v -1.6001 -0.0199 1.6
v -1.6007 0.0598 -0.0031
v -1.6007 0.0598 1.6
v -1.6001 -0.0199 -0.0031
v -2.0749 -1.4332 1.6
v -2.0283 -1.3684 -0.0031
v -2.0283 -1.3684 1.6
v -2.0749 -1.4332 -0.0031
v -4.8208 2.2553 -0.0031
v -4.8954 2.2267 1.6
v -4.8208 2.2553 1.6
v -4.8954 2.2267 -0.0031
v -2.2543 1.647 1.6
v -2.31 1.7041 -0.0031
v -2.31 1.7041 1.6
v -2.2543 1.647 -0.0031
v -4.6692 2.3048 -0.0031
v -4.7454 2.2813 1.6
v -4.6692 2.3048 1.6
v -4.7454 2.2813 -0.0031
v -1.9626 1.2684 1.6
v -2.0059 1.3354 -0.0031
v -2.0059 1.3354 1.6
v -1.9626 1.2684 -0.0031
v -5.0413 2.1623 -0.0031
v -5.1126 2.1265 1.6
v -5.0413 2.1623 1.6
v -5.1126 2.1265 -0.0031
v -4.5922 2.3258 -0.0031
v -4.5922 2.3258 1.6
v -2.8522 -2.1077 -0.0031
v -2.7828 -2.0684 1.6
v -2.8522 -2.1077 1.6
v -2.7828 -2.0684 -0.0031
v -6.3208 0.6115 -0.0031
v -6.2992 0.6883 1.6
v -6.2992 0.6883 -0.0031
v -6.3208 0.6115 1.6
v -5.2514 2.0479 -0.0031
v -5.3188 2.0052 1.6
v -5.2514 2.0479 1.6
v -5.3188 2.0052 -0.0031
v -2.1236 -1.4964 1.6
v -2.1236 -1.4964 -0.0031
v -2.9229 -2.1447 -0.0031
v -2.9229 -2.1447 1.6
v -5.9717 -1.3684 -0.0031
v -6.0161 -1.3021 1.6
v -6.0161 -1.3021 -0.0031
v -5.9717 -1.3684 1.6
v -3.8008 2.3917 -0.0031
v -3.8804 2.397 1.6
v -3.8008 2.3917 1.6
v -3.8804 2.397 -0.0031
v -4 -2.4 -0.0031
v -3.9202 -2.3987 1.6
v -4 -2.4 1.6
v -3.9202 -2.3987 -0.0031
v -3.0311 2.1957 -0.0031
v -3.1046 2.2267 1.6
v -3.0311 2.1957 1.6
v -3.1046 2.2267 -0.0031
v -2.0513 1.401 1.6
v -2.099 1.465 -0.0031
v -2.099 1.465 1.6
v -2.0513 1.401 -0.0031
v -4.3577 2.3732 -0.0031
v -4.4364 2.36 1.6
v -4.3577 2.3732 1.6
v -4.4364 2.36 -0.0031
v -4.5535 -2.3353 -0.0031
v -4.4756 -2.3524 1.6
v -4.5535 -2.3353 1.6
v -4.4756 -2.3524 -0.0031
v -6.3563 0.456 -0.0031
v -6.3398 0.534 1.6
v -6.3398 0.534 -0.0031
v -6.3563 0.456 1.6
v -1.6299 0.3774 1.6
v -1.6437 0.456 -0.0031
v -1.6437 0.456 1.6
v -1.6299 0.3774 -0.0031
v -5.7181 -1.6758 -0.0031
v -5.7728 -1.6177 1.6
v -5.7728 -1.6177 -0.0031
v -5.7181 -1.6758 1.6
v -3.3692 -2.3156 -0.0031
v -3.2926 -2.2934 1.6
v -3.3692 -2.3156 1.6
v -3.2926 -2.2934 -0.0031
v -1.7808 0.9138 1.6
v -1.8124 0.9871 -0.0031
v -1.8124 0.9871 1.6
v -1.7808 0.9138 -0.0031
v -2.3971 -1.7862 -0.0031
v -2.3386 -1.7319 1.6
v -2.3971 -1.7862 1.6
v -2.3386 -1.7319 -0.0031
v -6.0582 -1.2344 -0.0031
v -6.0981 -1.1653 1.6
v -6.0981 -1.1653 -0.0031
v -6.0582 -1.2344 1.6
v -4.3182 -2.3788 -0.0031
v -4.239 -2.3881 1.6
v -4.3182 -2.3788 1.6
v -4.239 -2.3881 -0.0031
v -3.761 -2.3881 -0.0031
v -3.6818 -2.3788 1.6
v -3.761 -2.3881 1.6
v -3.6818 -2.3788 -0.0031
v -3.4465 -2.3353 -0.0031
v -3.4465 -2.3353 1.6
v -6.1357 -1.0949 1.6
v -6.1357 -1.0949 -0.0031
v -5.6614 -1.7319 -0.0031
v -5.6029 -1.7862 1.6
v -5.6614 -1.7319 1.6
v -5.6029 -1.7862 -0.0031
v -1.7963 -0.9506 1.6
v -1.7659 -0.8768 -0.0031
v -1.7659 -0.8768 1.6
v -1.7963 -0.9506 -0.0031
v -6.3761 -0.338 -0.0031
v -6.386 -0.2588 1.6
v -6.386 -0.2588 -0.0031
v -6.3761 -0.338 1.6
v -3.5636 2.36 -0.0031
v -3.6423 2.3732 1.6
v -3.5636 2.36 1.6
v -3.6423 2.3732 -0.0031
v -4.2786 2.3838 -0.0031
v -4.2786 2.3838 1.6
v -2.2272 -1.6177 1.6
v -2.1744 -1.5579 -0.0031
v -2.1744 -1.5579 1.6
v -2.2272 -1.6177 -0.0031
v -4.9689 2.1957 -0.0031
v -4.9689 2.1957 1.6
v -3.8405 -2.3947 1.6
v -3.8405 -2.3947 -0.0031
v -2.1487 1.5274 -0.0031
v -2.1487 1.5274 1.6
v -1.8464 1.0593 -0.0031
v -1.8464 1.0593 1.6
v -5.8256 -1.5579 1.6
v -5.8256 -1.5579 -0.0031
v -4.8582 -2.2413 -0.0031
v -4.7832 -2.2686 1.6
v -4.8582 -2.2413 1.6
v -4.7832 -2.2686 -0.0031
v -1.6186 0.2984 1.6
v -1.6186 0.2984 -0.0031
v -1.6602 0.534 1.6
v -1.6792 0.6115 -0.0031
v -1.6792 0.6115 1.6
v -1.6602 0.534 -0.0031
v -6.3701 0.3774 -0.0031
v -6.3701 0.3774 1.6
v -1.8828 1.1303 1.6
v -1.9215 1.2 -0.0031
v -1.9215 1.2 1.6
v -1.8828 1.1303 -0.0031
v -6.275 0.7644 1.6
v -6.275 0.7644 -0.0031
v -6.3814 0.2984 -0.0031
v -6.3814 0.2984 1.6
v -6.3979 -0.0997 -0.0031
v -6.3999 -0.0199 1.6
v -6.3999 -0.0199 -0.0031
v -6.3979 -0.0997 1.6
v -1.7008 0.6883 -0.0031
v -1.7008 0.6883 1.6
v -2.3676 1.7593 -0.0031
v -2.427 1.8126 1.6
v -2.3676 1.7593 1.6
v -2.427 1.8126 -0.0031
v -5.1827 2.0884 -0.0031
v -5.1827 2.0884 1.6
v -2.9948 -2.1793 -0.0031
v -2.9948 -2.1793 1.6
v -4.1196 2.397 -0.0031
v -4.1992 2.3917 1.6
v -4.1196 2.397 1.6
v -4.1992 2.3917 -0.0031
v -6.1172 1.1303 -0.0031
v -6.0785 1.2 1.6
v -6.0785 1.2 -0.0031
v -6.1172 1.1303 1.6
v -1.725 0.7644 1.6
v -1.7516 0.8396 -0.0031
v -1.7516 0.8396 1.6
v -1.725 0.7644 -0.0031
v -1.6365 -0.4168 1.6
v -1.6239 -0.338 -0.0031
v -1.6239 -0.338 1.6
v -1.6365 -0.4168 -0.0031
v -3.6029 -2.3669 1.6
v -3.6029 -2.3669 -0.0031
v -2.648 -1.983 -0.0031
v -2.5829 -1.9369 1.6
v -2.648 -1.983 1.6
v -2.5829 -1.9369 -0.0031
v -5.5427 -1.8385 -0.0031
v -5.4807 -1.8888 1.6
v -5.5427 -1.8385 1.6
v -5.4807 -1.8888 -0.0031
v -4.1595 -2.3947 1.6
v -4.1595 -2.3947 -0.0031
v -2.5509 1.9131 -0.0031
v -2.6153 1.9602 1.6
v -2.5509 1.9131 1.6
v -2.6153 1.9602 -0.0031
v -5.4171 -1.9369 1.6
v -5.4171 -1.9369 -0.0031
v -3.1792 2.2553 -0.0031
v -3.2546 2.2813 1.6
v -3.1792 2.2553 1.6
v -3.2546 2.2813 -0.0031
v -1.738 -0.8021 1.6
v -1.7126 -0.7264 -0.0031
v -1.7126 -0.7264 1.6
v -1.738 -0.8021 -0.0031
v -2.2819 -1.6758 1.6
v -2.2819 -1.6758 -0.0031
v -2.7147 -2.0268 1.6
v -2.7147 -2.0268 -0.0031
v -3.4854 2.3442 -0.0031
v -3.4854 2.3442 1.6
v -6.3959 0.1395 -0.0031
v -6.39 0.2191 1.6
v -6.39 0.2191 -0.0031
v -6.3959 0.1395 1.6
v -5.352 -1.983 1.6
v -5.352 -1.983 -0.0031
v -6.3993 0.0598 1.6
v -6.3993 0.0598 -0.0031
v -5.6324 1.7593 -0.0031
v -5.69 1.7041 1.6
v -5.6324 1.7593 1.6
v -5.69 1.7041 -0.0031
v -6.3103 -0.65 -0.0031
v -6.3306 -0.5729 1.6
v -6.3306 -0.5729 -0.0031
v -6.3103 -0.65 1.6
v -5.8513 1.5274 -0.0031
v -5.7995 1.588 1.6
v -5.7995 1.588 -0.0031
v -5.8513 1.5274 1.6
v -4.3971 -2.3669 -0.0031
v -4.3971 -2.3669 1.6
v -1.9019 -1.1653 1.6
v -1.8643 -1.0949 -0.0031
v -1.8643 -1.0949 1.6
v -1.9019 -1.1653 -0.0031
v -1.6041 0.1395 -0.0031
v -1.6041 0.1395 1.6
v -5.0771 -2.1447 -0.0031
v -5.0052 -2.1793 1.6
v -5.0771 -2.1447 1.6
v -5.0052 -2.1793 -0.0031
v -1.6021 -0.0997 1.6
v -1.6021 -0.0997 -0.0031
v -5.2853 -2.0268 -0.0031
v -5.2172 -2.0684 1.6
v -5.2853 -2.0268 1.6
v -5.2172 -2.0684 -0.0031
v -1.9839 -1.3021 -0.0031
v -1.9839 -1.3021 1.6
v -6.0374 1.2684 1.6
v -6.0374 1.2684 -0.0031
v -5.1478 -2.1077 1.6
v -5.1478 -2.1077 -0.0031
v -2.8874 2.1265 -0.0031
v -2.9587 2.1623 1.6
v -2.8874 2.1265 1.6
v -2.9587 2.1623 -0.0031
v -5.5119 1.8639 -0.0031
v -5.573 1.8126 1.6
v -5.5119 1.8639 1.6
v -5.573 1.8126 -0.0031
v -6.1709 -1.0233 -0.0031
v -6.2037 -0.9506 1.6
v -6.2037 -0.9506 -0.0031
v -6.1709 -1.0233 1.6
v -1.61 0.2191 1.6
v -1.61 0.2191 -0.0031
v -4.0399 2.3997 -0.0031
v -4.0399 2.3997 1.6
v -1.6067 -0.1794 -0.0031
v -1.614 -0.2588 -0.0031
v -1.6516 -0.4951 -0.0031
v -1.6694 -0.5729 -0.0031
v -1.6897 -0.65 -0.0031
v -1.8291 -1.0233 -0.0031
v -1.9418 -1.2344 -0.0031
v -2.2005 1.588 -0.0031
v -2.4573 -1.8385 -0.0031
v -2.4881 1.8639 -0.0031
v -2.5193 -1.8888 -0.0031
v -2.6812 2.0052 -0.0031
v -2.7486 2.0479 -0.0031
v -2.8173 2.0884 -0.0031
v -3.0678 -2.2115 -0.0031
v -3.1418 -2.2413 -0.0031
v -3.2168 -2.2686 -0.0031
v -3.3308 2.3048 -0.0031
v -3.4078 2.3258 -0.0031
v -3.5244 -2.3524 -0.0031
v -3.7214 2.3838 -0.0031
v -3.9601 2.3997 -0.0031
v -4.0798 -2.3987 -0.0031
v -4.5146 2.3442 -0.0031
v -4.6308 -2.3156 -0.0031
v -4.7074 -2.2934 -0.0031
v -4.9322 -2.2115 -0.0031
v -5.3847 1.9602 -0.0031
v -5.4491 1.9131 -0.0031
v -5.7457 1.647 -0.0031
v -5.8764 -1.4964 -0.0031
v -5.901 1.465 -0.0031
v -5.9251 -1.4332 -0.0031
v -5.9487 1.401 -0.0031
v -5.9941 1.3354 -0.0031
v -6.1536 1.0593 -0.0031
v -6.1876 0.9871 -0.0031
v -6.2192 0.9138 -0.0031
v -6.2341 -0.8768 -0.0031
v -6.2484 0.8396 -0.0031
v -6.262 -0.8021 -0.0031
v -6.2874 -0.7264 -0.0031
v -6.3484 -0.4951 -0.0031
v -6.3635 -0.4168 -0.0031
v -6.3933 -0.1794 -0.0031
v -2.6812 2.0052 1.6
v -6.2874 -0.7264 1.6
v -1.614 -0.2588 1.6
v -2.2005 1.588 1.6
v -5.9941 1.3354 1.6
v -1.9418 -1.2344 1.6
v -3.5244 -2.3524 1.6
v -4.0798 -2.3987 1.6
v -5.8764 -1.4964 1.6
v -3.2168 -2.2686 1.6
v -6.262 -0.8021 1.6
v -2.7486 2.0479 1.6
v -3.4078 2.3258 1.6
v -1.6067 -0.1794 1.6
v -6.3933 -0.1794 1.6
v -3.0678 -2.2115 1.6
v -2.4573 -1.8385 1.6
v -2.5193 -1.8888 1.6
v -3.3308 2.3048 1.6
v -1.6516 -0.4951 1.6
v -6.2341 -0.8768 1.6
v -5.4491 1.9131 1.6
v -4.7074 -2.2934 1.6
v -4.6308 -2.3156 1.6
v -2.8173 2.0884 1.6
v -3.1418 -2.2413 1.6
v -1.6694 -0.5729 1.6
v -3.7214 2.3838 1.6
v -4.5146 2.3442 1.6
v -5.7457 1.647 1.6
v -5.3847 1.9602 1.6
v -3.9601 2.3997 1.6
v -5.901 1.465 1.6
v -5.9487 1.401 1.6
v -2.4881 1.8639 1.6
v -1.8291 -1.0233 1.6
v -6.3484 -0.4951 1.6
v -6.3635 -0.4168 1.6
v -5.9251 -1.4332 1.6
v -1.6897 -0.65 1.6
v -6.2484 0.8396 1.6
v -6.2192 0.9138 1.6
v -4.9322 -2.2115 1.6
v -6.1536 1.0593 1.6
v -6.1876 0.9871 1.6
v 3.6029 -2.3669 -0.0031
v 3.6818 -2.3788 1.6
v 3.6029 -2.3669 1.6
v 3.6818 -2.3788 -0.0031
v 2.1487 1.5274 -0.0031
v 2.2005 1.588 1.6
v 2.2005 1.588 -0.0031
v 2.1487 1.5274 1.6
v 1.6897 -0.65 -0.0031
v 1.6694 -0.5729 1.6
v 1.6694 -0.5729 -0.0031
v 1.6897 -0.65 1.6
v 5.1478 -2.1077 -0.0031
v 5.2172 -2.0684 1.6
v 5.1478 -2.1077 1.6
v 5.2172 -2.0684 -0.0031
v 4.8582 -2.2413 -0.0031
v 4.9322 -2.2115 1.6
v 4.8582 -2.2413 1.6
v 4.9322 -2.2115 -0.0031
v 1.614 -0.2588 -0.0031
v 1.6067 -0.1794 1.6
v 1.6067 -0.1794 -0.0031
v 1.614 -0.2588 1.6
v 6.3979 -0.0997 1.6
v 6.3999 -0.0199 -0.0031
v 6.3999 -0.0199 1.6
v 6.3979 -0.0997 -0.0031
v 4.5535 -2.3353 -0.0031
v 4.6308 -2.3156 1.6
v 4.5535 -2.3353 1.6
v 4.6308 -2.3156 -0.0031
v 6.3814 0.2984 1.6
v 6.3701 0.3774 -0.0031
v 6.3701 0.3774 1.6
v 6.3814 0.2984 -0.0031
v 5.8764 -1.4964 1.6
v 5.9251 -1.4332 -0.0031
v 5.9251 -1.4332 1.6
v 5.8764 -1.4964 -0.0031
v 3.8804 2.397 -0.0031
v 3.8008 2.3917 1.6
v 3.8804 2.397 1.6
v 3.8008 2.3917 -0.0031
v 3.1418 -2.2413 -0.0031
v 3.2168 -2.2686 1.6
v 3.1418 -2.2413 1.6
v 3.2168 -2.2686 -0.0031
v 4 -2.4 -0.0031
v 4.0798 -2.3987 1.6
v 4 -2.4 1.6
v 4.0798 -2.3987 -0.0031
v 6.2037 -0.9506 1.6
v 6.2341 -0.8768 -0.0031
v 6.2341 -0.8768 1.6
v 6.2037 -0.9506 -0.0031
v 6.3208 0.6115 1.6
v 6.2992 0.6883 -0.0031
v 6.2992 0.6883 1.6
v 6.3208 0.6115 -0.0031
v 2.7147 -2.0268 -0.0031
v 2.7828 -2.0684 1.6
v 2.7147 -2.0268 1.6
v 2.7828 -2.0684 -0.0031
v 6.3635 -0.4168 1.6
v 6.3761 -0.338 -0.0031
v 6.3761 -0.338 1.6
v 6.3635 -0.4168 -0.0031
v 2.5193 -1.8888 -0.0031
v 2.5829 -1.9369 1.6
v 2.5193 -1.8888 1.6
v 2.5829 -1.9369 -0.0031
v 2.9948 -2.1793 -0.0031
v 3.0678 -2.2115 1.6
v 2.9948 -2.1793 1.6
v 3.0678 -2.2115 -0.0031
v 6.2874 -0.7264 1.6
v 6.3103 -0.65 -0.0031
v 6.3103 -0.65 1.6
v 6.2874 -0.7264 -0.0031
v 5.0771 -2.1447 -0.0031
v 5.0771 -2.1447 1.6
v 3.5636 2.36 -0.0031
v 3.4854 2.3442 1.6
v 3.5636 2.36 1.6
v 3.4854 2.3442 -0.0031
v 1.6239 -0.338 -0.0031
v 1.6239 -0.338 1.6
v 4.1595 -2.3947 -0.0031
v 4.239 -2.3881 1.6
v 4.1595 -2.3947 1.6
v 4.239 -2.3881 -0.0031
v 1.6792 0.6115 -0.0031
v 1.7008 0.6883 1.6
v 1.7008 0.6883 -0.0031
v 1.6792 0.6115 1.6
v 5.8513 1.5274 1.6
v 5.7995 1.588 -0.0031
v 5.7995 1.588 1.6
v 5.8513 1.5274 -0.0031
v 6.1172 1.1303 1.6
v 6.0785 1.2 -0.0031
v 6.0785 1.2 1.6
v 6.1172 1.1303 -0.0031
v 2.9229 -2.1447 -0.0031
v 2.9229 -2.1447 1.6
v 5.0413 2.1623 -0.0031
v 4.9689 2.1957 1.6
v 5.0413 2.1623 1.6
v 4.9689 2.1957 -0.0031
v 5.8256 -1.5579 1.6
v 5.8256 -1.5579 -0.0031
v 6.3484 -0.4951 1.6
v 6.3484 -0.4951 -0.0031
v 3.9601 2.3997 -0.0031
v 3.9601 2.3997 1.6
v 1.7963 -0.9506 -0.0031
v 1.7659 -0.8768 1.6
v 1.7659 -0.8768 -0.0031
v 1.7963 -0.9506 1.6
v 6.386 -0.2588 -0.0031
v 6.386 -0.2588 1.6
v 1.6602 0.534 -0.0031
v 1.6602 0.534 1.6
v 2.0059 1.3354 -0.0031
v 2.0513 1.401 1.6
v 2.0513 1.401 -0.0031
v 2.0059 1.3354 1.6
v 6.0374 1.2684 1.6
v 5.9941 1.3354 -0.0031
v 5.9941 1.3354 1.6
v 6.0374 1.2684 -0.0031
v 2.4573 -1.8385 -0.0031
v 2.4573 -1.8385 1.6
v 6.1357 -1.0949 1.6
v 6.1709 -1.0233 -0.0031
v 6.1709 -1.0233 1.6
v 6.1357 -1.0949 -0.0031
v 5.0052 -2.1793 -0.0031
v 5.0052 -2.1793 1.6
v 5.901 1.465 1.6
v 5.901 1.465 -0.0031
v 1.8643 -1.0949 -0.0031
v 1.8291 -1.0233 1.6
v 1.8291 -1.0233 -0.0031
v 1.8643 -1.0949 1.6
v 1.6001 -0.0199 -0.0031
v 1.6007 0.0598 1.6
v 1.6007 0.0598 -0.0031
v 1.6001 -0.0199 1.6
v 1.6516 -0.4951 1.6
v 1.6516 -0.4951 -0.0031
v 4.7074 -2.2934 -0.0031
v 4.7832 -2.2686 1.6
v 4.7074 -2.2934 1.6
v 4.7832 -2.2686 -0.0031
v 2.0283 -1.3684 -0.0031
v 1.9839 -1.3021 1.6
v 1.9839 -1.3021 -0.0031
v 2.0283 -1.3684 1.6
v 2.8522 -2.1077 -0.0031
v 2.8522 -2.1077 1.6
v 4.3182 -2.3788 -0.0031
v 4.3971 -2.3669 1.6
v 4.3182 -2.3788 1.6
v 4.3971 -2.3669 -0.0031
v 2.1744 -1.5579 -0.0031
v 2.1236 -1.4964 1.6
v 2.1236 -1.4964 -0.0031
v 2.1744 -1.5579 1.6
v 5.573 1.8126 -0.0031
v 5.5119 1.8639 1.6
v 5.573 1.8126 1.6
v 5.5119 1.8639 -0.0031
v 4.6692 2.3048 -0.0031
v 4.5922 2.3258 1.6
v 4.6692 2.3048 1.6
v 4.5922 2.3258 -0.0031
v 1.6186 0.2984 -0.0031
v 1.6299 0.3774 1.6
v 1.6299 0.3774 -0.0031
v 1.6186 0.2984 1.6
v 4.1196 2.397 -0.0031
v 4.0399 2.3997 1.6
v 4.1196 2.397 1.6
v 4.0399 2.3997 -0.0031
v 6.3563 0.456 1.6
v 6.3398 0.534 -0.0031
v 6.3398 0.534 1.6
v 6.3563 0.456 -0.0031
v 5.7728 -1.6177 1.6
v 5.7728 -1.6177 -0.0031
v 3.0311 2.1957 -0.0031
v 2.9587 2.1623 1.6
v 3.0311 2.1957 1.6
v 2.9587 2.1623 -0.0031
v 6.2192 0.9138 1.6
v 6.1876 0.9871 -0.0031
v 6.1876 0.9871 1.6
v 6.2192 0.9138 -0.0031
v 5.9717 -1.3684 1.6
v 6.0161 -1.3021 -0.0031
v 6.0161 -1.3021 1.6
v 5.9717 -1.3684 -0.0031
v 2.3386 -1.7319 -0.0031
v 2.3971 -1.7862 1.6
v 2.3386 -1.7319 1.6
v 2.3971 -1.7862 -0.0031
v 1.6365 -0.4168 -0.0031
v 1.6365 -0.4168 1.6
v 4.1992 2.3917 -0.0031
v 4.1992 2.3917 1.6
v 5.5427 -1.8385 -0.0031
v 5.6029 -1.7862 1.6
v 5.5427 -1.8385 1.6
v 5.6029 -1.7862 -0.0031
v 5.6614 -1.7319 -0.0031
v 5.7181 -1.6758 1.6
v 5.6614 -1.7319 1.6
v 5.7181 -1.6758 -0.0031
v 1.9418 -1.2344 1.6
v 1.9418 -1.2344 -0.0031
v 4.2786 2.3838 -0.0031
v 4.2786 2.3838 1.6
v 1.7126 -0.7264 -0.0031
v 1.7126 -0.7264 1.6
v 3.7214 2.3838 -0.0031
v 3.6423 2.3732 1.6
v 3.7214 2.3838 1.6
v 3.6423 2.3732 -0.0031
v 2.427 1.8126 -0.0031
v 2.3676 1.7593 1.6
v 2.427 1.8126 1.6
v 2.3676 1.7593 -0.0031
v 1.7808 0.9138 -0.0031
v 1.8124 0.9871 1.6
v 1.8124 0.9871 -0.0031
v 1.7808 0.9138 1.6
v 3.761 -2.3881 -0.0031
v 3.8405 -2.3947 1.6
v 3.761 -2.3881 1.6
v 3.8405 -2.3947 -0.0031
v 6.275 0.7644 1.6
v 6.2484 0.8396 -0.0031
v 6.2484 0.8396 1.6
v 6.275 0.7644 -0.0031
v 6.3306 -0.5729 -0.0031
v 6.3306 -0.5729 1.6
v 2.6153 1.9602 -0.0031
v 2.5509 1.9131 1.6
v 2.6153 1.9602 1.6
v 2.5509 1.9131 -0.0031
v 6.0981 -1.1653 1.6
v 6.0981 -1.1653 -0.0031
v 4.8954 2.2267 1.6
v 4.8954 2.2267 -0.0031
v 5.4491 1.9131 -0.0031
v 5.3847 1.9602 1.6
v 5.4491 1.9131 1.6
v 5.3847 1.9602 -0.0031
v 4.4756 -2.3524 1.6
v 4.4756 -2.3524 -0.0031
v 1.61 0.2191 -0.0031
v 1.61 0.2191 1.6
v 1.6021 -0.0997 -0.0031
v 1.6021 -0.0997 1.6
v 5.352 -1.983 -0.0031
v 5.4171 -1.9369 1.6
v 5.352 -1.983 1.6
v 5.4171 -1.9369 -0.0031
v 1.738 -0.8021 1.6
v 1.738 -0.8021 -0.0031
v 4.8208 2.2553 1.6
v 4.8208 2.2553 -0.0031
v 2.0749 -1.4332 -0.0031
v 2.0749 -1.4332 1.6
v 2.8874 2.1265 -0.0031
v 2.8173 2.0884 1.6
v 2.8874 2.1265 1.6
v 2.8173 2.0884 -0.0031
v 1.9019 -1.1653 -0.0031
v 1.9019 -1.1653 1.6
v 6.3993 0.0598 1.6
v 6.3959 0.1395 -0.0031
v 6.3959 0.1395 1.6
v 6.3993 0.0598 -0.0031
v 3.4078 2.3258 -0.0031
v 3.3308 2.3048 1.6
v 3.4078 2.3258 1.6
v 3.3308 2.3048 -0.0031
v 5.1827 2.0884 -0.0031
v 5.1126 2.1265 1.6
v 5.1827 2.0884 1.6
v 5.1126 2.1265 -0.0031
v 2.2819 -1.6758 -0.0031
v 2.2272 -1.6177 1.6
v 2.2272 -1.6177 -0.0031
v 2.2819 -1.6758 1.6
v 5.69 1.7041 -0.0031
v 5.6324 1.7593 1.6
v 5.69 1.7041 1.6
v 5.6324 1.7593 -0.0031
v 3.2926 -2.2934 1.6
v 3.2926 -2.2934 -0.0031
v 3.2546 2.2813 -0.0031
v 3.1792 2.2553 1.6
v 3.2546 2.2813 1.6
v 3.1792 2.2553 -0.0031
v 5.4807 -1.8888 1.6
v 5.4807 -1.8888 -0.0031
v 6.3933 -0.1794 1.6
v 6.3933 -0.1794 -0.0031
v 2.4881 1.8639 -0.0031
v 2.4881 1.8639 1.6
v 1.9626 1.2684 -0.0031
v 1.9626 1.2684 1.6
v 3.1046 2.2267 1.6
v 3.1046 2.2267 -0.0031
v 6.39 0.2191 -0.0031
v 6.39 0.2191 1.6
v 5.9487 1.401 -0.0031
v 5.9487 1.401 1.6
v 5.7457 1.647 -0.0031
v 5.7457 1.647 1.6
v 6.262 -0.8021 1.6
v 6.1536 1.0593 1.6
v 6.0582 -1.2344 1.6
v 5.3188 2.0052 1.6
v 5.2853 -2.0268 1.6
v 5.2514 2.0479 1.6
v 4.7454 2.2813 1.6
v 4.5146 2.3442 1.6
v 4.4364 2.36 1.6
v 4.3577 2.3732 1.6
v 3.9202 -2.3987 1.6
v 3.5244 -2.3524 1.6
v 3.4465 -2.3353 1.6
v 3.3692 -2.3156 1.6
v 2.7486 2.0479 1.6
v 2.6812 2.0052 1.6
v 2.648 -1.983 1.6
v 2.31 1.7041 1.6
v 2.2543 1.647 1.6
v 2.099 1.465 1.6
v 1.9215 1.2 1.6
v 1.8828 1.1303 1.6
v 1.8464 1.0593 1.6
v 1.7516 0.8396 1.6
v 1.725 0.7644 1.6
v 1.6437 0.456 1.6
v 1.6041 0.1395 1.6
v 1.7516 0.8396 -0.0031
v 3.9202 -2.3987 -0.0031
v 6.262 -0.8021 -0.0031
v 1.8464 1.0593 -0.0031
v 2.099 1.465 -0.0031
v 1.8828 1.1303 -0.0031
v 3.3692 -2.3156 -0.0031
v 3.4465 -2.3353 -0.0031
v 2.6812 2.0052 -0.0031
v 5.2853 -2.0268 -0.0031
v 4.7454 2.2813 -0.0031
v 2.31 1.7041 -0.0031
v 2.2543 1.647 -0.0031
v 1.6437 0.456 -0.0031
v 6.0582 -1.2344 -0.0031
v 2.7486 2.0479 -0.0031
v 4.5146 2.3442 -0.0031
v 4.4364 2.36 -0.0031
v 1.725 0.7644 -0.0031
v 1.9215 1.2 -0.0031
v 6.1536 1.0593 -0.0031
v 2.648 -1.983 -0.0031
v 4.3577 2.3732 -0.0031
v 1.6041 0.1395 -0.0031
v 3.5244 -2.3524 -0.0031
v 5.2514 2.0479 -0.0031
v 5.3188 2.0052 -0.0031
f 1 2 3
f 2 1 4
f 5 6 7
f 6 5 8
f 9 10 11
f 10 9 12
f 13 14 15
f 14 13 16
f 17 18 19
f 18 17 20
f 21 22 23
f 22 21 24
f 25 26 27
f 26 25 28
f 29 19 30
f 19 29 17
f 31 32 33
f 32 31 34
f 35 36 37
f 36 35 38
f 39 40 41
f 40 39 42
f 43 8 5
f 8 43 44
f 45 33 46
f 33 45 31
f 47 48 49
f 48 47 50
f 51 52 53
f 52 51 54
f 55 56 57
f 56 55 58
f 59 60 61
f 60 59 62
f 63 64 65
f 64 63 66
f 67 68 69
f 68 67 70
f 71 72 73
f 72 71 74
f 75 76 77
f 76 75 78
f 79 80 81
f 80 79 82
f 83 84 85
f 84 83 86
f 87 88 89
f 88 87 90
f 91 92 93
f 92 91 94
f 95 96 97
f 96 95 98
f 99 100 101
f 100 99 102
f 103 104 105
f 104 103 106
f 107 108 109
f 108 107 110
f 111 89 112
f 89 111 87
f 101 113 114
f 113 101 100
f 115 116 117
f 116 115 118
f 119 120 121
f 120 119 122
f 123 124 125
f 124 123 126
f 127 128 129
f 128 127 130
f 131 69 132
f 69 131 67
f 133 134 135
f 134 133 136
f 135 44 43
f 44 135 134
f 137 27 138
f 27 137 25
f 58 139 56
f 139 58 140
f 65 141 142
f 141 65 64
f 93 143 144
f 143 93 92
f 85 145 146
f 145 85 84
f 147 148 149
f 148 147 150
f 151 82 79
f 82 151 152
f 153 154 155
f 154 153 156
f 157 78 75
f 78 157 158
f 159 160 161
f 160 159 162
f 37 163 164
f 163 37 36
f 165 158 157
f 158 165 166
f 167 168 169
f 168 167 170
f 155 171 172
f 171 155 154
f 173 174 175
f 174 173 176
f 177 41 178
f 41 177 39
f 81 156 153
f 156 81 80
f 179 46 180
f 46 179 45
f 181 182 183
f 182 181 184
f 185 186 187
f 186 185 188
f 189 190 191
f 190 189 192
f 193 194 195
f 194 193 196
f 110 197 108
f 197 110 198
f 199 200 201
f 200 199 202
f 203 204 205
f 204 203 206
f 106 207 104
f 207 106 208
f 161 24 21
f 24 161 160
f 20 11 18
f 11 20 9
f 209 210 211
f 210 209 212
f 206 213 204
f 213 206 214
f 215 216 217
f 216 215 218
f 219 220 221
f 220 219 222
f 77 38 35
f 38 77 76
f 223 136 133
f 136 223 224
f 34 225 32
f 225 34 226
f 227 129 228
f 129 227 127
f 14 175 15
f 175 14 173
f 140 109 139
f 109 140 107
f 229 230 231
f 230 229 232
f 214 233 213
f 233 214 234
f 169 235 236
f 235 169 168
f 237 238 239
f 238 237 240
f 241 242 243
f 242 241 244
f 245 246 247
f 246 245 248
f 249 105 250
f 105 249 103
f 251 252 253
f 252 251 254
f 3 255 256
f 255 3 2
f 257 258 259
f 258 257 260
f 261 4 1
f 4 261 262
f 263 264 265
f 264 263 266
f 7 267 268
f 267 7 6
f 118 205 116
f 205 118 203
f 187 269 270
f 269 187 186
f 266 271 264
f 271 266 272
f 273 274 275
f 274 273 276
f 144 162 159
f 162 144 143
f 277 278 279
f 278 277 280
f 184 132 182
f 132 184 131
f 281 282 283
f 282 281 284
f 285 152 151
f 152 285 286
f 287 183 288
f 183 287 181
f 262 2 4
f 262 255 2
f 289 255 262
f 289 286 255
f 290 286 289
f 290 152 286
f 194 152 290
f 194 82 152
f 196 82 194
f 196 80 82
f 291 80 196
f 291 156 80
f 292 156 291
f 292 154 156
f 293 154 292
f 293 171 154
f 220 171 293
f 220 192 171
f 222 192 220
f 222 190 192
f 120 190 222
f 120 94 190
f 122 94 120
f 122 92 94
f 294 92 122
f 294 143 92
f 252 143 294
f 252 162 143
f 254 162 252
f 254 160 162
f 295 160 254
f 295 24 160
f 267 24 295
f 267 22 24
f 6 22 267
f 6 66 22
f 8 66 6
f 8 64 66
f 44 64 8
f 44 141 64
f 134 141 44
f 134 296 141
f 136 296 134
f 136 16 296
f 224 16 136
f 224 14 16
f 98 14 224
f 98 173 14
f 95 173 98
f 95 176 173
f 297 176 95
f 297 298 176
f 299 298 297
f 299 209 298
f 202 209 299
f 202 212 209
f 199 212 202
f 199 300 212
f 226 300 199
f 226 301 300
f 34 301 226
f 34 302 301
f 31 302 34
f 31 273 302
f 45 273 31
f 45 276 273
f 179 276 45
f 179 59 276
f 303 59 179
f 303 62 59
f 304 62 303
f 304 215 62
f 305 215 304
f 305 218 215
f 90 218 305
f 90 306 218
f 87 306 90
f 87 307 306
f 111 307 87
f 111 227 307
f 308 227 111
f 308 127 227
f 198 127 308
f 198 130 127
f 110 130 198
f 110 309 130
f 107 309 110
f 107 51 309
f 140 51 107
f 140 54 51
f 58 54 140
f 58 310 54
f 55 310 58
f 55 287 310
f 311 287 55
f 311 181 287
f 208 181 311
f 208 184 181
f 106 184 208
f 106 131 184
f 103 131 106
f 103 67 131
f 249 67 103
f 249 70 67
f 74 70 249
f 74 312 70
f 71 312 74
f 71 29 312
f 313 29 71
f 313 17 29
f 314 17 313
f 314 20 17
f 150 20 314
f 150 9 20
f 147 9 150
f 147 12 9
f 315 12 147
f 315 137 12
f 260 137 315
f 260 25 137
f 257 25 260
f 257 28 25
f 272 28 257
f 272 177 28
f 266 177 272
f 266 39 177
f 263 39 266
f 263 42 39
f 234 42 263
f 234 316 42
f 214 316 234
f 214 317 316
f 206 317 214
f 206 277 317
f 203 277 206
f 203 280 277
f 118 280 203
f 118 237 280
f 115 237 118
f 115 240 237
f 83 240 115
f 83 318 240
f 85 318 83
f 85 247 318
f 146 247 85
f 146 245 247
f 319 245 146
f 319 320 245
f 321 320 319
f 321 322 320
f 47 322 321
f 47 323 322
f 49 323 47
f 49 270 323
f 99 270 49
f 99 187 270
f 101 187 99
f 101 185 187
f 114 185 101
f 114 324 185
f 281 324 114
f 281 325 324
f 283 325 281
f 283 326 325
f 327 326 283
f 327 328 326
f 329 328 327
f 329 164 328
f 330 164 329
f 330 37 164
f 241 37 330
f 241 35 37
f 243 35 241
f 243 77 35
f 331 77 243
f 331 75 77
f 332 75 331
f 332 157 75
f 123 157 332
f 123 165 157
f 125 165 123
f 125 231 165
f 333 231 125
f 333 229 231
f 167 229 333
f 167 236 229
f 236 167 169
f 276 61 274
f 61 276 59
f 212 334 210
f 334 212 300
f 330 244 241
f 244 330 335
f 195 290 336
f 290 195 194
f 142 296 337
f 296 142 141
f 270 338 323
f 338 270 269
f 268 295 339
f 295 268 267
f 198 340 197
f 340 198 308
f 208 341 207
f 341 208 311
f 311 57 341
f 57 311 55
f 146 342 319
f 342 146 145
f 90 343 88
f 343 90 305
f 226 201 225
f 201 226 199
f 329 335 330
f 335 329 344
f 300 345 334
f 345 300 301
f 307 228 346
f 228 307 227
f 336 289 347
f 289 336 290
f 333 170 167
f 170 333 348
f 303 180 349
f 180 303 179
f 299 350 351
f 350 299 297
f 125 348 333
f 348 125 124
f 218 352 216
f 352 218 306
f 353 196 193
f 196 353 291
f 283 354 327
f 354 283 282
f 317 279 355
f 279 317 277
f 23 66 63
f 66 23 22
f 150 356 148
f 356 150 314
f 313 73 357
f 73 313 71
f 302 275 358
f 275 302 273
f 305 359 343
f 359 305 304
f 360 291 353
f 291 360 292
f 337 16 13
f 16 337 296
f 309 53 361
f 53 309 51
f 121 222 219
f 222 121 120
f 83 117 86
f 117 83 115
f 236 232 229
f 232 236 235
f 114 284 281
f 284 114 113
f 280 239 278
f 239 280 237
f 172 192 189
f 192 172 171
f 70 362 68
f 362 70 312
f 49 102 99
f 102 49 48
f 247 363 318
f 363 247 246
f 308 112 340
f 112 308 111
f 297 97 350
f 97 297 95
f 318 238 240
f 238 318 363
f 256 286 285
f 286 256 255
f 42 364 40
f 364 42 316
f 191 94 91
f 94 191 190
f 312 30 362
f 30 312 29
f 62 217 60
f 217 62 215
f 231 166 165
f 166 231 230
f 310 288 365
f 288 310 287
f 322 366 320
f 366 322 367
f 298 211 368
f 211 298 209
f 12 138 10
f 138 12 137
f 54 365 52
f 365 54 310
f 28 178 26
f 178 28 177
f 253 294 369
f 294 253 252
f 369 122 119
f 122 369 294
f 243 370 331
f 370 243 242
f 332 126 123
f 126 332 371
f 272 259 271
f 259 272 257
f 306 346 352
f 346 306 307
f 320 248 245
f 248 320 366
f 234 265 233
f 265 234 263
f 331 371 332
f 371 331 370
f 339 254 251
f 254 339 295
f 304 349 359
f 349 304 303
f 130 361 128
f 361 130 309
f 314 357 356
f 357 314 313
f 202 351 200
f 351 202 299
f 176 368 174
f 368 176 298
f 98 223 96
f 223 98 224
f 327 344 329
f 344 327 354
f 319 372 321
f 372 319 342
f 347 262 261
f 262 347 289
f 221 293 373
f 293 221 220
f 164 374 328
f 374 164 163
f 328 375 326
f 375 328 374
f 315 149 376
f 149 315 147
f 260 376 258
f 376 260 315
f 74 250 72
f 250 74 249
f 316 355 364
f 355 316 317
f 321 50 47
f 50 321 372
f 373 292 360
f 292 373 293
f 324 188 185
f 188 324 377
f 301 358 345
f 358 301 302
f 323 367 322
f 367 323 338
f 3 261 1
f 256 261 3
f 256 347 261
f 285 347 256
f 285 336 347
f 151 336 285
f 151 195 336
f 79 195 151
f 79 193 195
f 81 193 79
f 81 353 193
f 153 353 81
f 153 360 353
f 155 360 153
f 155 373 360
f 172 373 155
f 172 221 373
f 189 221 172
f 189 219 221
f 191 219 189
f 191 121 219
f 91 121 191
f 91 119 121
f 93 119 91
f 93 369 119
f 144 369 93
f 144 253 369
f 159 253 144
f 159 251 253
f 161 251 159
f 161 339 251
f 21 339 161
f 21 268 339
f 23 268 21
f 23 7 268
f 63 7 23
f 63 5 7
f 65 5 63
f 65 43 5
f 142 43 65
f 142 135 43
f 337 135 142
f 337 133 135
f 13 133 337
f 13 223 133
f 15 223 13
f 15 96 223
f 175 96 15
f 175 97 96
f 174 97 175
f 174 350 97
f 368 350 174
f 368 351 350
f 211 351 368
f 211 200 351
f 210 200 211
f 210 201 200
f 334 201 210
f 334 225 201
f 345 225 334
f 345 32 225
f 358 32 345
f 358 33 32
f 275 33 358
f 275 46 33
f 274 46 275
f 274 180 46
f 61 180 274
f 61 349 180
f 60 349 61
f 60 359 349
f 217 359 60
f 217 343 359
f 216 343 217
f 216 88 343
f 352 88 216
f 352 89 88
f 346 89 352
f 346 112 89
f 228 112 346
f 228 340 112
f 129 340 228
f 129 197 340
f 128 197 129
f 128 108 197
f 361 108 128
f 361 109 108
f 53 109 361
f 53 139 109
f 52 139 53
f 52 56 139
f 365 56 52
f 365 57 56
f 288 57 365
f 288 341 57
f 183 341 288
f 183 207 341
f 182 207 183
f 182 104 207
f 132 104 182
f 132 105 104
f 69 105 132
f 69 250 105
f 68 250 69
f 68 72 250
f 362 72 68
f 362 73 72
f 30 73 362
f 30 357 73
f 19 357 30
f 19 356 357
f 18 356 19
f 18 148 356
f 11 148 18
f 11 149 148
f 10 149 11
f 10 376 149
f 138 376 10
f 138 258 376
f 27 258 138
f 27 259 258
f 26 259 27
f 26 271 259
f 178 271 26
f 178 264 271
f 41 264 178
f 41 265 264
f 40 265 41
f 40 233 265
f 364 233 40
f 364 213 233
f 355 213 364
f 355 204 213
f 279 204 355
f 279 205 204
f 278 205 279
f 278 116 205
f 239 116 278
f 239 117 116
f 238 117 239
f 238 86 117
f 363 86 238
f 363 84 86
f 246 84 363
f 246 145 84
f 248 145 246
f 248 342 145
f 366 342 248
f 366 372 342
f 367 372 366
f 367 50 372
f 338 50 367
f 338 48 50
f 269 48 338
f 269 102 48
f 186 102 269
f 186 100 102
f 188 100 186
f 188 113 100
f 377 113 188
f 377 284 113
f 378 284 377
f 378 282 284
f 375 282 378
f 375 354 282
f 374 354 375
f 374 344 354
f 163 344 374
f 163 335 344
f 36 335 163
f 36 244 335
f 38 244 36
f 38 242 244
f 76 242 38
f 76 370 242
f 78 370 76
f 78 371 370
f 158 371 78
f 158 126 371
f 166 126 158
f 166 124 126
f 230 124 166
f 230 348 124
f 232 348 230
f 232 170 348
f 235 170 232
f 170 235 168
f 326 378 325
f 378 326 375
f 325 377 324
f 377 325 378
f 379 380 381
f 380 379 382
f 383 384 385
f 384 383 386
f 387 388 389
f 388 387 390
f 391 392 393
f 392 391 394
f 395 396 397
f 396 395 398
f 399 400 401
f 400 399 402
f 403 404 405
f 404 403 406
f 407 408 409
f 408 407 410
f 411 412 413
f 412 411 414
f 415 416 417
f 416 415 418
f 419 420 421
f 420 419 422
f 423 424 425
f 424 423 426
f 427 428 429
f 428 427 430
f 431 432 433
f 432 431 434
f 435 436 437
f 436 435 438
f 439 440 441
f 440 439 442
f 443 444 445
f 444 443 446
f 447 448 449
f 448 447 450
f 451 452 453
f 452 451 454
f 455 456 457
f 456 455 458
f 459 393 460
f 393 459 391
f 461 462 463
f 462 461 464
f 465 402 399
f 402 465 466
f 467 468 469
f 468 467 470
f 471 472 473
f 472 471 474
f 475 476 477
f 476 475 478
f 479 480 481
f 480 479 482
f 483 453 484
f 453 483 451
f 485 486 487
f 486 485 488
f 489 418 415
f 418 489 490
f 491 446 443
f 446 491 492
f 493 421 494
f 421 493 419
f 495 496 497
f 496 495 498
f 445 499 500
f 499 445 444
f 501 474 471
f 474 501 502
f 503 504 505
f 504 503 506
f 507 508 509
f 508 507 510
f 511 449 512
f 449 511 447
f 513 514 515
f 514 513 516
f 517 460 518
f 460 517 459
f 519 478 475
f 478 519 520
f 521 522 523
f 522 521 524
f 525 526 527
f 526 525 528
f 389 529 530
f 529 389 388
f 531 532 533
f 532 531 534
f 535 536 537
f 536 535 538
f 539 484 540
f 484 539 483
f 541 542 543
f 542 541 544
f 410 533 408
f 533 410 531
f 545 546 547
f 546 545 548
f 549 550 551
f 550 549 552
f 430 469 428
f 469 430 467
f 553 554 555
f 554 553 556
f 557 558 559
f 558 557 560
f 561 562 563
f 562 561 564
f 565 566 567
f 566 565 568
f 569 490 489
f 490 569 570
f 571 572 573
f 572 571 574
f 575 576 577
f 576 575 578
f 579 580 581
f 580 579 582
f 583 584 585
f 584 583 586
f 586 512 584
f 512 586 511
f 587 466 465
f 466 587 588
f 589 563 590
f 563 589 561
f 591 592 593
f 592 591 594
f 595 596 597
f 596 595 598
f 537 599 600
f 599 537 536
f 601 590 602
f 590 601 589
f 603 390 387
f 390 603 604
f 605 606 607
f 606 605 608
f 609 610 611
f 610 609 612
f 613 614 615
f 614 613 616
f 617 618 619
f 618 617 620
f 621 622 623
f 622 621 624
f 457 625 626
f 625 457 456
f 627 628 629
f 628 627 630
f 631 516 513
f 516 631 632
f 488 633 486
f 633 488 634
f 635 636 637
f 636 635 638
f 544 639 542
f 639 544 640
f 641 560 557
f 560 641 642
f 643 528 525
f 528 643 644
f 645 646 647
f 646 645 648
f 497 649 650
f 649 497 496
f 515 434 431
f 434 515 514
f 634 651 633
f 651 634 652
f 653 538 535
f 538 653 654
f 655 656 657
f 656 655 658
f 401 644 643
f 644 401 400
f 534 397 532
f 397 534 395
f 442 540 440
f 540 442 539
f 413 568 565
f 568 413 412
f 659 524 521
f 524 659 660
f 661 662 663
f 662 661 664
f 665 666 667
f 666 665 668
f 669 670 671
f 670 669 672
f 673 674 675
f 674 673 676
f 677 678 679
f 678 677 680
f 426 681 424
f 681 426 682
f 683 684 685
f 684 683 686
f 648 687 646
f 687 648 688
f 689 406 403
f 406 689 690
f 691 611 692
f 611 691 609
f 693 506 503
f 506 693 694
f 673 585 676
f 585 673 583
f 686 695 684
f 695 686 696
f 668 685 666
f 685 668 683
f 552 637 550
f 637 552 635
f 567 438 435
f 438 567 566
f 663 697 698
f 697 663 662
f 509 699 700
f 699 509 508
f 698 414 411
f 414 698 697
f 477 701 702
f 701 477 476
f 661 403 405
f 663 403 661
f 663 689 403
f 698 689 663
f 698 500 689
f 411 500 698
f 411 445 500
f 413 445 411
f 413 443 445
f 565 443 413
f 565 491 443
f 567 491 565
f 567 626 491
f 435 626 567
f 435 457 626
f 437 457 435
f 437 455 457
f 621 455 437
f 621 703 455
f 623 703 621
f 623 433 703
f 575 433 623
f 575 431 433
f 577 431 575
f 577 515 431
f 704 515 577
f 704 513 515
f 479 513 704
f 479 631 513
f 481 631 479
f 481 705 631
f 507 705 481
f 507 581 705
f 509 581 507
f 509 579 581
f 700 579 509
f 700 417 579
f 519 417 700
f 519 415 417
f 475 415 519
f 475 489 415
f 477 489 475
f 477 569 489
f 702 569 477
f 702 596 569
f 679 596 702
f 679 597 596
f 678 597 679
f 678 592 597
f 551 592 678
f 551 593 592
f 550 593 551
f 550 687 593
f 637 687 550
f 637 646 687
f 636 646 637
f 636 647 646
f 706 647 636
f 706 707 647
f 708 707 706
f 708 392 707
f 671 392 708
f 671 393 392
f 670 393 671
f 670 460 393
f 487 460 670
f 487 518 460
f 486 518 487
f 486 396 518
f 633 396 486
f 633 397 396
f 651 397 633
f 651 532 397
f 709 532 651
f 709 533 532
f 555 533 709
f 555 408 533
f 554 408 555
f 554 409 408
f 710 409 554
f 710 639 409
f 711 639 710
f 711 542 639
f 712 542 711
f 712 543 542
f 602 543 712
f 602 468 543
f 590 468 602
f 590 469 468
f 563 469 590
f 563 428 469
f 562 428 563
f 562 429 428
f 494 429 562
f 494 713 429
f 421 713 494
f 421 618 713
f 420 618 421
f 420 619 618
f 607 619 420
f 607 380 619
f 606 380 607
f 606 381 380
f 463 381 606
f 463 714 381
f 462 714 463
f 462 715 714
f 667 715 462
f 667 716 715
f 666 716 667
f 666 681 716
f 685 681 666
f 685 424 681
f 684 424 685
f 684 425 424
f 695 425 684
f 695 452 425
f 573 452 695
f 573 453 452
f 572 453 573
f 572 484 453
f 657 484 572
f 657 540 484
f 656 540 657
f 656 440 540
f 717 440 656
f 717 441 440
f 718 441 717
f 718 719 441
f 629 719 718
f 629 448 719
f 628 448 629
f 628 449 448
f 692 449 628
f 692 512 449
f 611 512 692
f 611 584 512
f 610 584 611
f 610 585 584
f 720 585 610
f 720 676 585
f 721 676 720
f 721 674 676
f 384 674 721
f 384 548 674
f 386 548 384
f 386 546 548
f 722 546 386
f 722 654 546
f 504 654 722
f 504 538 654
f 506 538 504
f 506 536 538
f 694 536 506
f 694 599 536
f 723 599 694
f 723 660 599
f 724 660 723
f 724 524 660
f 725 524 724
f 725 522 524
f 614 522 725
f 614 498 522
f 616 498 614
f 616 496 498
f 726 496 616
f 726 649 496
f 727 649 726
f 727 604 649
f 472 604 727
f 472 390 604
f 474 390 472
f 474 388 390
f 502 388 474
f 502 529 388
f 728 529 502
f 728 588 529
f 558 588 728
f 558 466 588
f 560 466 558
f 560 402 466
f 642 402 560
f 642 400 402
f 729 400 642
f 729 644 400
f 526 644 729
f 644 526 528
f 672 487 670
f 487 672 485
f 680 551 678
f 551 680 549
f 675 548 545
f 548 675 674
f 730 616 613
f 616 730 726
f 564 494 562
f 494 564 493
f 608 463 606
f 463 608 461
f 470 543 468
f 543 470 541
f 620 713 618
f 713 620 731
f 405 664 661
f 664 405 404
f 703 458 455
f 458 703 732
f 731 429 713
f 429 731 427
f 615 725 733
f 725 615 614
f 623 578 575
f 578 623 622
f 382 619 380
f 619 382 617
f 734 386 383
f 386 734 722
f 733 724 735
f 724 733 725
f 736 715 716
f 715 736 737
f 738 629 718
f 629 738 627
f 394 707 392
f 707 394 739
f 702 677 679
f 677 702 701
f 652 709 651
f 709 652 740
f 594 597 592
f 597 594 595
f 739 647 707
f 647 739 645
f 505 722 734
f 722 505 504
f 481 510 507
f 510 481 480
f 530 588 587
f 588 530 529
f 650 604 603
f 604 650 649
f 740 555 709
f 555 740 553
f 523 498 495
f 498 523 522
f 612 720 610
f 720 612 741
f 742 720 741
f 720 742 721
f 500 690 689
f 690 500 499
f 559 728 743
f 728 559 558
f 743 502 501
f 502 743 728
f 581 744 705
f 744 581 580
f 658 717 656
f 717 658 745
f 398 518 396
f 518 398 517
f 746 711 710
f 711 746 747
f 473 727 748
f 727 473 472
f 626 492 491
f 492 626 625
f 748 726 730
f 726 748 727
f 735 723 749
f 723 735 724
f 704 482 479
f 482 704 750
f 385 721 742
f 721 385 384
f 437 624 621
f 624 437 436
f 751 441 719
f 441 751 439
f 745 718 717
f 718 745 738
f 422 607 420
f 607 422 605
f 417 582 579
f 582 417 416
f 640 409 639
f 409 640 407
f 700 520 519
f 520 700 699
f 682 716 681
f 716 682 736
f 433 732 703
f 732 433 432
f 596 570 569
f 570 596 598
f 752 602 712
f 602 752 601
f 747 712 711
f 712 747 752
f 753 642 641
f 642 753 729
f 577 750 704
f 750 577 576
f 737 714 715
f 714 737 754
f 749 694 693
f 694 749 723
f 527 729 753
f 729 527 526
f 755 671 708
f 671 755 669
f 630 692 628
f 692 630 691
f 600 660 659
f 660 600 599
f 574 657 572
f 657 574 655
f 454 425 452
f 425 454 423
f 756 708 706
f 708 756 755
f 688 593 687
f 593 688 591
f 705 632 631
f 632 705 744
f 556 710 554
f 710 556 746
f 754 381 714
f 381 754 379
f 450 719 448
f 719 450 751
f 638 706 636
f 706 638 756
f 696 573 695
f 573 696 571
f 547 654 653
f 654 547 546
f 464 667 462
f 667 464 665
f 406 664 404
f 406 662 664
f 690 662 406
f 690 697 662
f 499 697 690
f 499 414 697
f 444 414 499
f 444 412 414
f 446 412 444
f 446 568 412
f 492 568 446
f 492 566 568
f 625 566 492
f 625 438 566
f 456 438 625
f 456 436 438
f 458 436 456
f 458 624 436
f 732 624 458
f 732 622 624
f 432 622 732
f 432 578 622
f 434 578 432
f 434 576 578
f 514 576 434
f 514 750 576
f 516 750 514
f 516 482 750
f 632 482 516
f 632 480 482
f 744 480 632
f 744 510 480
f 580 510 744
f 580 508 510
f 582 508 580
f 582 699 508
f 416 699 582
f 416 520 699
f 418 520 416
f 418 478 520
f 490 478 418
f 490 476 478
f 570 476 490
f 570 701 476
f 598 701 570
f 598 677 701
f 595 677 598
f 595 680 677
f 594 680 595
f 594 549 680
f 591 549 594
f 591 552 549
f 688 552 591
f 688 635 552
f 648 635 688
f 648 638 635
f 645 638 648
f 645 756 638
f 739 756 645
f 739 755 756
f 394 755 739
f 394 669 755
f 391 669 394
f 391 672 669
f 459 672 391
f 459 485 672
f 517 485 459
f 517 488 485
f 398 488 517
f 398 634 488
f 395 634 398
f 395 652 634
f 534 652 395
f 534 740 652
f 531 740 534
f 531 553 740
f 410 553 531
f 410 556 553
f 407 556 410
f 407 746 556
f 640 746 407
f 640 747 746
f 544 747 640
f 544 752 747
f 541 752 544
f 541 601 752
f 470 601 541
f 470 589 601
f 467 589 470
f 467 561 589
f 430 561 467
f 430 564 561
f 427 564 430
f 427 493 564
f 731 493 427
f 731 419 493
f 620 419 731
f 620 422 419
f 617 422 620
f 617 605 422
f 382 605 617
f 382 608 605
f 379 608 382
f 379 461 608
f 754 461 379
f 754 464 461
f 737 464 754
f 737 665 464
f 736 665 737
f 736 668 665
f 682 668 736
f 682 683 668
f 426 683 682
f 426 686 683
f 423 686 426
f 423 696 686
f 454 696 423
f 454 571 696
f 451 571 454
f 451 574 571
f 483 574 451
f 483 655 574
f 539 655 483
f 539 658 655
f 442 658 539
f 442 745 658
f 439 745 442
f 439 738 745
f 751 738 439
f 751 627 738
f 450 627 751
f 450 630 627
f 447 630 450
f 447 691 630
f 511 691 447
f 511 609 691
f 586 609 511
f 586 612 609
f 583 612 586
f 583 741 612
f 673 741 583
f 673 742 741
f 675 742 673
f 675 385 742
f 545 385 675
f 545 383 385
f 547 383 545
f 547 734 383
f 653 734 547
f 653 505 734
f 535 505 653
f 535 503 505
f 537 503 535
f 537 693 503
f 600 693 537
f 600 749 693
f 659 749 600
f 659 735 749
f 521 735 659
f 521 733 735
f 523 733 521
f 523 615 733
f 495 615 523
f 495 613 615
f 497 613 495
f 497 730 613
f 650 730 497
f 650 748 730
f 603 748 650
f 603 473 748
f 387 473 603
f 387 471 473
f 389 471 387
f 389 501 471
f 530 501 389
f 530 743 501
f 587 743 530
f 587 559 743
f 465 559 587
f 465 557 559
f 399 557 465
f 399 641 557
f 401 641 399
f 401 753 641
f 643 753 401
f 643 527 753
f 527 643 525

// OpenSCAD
use <../lib.scad>
use <../p/1-4chrd.scad>
use <../p/48/1-8chrd.scad>
use <s/65633s01.scad>
$fa=1; $fs=0.2;
function ldraw_lib__65633(realsolid=false) = [
// 0 Windscreen  6 x  6 x  1.333 Angled Curved
// 0 Name: 65633.dat
// 0 Author: Magnus Forsberg [MagFors]
// 0 !LDRAW_ORG Part UPDATE 2020-03
// 0 !LICENSE Licensed under CC BY 2.0 and CC BY 4.0 : see CAreadme.txt
// 
// 0 BFC CERTIFY CCW
  [0,"BFC","CERTIFY"],
  [0,"BFC","CCW"],
// 
// 0 !HISTORY 2020-12-29 [PTadmin] Official Update 2020-03
// 
// 
// 1 16 0 0 0 1 0 0 0 1 0 0 0 1 s\65633s01.dat
  [1,16,0,0,0,1,0,0,0,1,0,0,0,1, ldraw_lib__s__65633s01(realsolid)],
// 
// 0 // roof
// 4 16 -40 0 10 -40 0 -30 40 0 -30 40 0 10
  [4,16,-40,0,10,-40,0,-30,40,0,-30,40,0,10],
// 
// 3 16 -40 0 -30 0 0 -39.9864 40 0 -30
  [3,16,-40,0,-30,0,0,-39.9864,40,0,-30],
// 1 16 0 0 -5.8914 0 0 56.56887 0 1 0 -34.095 0 0 48\1-8chrd.dat
  [1,16,0,0,-5.8914,0,0,56.56887,0,1,0,-34.095,0,0, ldraw_lib__48__1_8chrd(realsolid)],
// 1 16 0 0 -5.8914 0 0 -56.56887 0 1 0 -34.095 0 0 48\1-8chrd.dat
  [1,16,0,0,-5.8914,0,0,-56.56887,0,1,0,-34.095,0,0, ldraw_lib__48__1_8chrd(realsolid)],
// 
// 0 // windscreen
// 3 16 51.6589 27.5 -95.9002 60 27.5 -90 40 0 -30
  [3,16,51.6589,27.5,-95.9002,60,27.5,-90,40,0,-30],
// 4 16 51.6589 27.5 -95.9002 40 0 -30 34.4391 0 -32.9424 42.4268 27.5 -100.8332
  [4,16,51.6589,27.5,-95.9002,40,0,-30,34.4391,0,-32.9424,42.4268,27.5,-100.8332],
// 4 16 42.4268 27.5 -100.8332 34.4391 0 -32.9424 28.2844 0 -35.4177 32.4735 27.5 -104.7673
  [4,16,42.4268,27.5,-100.8332,34.4391,0,-32.9424,28.2844,0,-35.4177,32.4735,27.5,-104.7673],
// 4 16 32.4735 27.5 -104.7673 28.2844 0 -35.4177 21.6489 0 -37.3918 21.9601 27.5 -107.621
  [4,16,32.4735,27.5,-104.7673,28.2844,0,-35.4177,21.6489,0,-37.3918,21.9601,27.5,-107.621],
// 3 16 14.64 0 -38.8238 21.9601 27.5 -107.621 21.6489 0 -37.3918
  [3,16,14.64,0,-38.8238,21.9601,27.5,-107.621,21.6489,0,-37.3918],
// 3 16 -40 0 -30 -60 27.5 -90 -51.6589 27.5 -95.9002
  [3,16,-40,0,-30,-60,27.5,-90,-51.6589,27.5,-95.9002],
// 4 16 -34.4391 0 -32.9424 -40 0 -30 -51.6589 27.5 -95.9002 -42.4268 27.5 -100.8332
  [4,16,-34.4391,0,-32.9424,-40,0,-30,-51.6589,27.5,-95.9002,-42.4268,27.5,-100.8332],
// 4 16 -28.2844 0 -35.4177 -34.4391 0 -32.9424 -42.4268 27.5 -100.8332 -32.4735 27.5 -104.7673
  [4,16,-28.2844,0,-35.4177,-34.4391,0,-32.9424,-42.4268,27.5,-100.8332,-32.4735,27.5,-104.7673],
// 4 16 -21.6489 0 -37.3918 -28.2844 0 -35.4177 -32.4735 27.5 -104.7673 -21.9601 27.5 -107.621
  [4,16,-21.6489,0,-37.3918,-28.2844,0,-35.4177,-32.4735,27.5,-104.7673,-21.9601,27.5,-107.621],
// 3 16 -21.9601 27.5 -107.621 -14.64 0 -38.8238 -21.6489 0 -37.3918
  [3,16,-21.9601,27.5,-107.621,-14.64,0,-38.8238,-21.6489,0,-37.3918],
// 4 16 21.9601 27.5 -107.621 14.64 0 -38.8238 7.3822 0 -39.6932 11.0734 27.5 -109.3537
  [4,16,21.9601,27.5,-107.621,14.64,0,-38.8238,7.3822,0,-39.6932,11.0734,27.5,-109.3537],
// 4 16 0 27.5 -109.938 11.0734 27.5 -109.3537 7.3822 0 -39.6932 0 0 -39.9864
  [4,16,0,27.5,-109.938,11.0734,27.5,-109.3537,7.3822,0,-39.6932,0,0,-39.9864],
// 4 16 -7.3822 0 -39.6932 -14.64 0 -38.8238 -21.9601 27.5 -107.621 -11.0734 27.5 -109.3537
  [4,16,-7.3822,0,-39.6932,-14.64,0,-38.8238,-21.9601,27.5,-107.621,-11.0734,27.5,-109.3537],
// 4 16 -7.3822 0 -39.6932 -11.0734 27.5 -109.3537 0 27.5 -109.938 0 0 -39.9864
  [4,16,-7.3822,0,-39.6932,-11.0734,27.5,-109.3537,0,27.5,-109.938,0,0,-39.9864],
// 
// 0 // left side
// 4 16 60 20 10 40 0 10 40 0 -30 60 20.2336 -7.037
  [4,16,60,20,10,40,0,10,40,0,-30,60,20.2336,-7.037],
// 3 16 60 20.2336 -7.037 40 0 -30 60 20.8705 -24.074
  [3,16,60,20.2336,-7.037,40,0,-30,60,20.8705,-24.074],
// 3 16 60 20.8705 -24.074 40 0 -30 60 21.9659 -40.8238
  [3,16,60,20.8705,-24.074,40,0,-30,60,21.9659,-40.8238],
// 3 16 60 21.9659 -40.8238 40 0 -30 60 23.4612 -57.5736
  [3,16,60,21.9659,-40.8238,40,0,-30,60,23.4612,-57.5736],
// 3 16 60 23.4612 -57.5736 40 0 -30 60 25.3806 -73.7868
  [3,16,60,23.4612,-57.5736,40,0,-30,60,25.3806,-73.7868],
// 3 16 60 25.3806 -73.7868 40 0 -30 60 27.5 -90
  [3,16,60,25.3806,-73.7868,40,0,-30,60,27.5,-90],
// 4 16 60 25.3806 -73.7868 60 27.5 -90 60 32 -90 60 23.4612 -57.5736
  [4,16,60,25.3806,-73.7868,60,27.5,-90,60,32,-90,60,23.4612,-57.5736],
// 4 16 60 32 -90 60 32 8 60 21.9659 -40.8238 60 23.4612 -57.5736
  [4,16,60,32,-90,60,32,8,60,21.9659,-40.8238,60,23.4612,-57.5736],
// 4 16 60 21.9659 -40.8238 60 32 8 60 30 10 60 20.8705 -24.074
  [4,16,60,21.9659,-40.8238,60,32,8,60,30,10,60,20.8705,-24.074],
// 4 16 60 20.2336 -7.037 60 20.8705 -24.074 60 30 10 60 20 10
  [4,16,60,20.2336,-7.037,60,20.8705,-24.074,60,30,10,60,20,10],
// 1 16 60 30 8 0 -1 0 2 0 0 0 0 2 1-4chrd.dat
  [1,16,60,30,8,0,-1,0,2,0,0,0,0,2, ldraw_lib__1_4chrd(realsolid)],
// 
// 0 // right side
// 4 16 -40 0 -30 -40 0 10 -60 20 10 -60 20.2336 -7.037
  [4,16,-40,0,-30,-40,0,10,-60,20,10,-60,20.2336,-7.037],
// 3 16 -40 0 -30 -60 20.2336 -7.037 -60 20.8705 -24.074
  [3,16,-40,0,-30,-60,20.2336,-7.037,-60,20.8705,-24.074],
// 3 16 -40 0 -30 -60 20.8705 -24.074 -60 21.9659 -40.8238
  [3,16,-40,0,-30,-60,20.8705,-24.074,-60,21.9659,-40.8238],
// 3 16 -40 0 -30 -60 21.9659 -40.8238 -60 23.4612 -57.5736
  [3,16,-40,0,-30,-60,21.9659,-40.8238,-60,23.4612,-57.5736],
// 3 16 -40 0 -30 -60 23.4612 -57.5736 -60 25.3806 -73.7868
  [3,16,-40,0,-30,-60,23.4612,-57.5736,-60,25.3806,-73.7868],
// 3 16 -40 0 -30 -60 25.3806 -73.7868 -60 27.5 -90
  [3,16,-40,0,-30,-60,25.3806,-73.7868,-60,27.5,-90],
// 4 16 -60 32 -90 -60 27.5 -90 -60 25.3806 -73.7868 -60 23.4612 -57.5736
  [4,16,-60,32,-90,-60,27.5,-90,-60,25.3806,-73.7868,-60,23.4612,-57.5736],
// 4 16 -60 21.9659 -40.8238 -60 32 8 -60 32 -90 -60 23.4612 -57.5736
  [4,16,-60,21.9659,-40.8238,-60,32,8,-60,32,-90,-60,23.4612,-57.5736],
// 4 16 -60 30 10 -60 32 8 -60 21.9659 -40.8238 -60 20.8705 -24.074
  [4,16,-60,30,10,-60,32,8,-60,21.9659,-40.8238,-60,20.8705,-24.074],
// 4 16 -60 30 10 -60 20.8705 -24.074 -60 20.2336 -7.037 -60 20 10
  [4,16,-60,30,10,-60,20.8705,-24.074,-60,20.2336,-7.037,-60,20,10],
// 1 16 -60 30 8 0 1 0 2 0 0 0 0 2 1-4chrd.dat
  [1,16,-60,30,8,0,1,0,2,0,0,0,0,2, ldraw_lib__1_4chrd(realsolid)],
];
module ldraw_lib__65633(step=0, col=false, unit=2/5, alt=false, line=0.2, solid=!$preview)
    makepoly(ldraw_lib__65633(solid), step=step, col=col, unit=unit, alt=alt, line=line, solid=solid);
ldraw_lib__65633(line=0.2);
